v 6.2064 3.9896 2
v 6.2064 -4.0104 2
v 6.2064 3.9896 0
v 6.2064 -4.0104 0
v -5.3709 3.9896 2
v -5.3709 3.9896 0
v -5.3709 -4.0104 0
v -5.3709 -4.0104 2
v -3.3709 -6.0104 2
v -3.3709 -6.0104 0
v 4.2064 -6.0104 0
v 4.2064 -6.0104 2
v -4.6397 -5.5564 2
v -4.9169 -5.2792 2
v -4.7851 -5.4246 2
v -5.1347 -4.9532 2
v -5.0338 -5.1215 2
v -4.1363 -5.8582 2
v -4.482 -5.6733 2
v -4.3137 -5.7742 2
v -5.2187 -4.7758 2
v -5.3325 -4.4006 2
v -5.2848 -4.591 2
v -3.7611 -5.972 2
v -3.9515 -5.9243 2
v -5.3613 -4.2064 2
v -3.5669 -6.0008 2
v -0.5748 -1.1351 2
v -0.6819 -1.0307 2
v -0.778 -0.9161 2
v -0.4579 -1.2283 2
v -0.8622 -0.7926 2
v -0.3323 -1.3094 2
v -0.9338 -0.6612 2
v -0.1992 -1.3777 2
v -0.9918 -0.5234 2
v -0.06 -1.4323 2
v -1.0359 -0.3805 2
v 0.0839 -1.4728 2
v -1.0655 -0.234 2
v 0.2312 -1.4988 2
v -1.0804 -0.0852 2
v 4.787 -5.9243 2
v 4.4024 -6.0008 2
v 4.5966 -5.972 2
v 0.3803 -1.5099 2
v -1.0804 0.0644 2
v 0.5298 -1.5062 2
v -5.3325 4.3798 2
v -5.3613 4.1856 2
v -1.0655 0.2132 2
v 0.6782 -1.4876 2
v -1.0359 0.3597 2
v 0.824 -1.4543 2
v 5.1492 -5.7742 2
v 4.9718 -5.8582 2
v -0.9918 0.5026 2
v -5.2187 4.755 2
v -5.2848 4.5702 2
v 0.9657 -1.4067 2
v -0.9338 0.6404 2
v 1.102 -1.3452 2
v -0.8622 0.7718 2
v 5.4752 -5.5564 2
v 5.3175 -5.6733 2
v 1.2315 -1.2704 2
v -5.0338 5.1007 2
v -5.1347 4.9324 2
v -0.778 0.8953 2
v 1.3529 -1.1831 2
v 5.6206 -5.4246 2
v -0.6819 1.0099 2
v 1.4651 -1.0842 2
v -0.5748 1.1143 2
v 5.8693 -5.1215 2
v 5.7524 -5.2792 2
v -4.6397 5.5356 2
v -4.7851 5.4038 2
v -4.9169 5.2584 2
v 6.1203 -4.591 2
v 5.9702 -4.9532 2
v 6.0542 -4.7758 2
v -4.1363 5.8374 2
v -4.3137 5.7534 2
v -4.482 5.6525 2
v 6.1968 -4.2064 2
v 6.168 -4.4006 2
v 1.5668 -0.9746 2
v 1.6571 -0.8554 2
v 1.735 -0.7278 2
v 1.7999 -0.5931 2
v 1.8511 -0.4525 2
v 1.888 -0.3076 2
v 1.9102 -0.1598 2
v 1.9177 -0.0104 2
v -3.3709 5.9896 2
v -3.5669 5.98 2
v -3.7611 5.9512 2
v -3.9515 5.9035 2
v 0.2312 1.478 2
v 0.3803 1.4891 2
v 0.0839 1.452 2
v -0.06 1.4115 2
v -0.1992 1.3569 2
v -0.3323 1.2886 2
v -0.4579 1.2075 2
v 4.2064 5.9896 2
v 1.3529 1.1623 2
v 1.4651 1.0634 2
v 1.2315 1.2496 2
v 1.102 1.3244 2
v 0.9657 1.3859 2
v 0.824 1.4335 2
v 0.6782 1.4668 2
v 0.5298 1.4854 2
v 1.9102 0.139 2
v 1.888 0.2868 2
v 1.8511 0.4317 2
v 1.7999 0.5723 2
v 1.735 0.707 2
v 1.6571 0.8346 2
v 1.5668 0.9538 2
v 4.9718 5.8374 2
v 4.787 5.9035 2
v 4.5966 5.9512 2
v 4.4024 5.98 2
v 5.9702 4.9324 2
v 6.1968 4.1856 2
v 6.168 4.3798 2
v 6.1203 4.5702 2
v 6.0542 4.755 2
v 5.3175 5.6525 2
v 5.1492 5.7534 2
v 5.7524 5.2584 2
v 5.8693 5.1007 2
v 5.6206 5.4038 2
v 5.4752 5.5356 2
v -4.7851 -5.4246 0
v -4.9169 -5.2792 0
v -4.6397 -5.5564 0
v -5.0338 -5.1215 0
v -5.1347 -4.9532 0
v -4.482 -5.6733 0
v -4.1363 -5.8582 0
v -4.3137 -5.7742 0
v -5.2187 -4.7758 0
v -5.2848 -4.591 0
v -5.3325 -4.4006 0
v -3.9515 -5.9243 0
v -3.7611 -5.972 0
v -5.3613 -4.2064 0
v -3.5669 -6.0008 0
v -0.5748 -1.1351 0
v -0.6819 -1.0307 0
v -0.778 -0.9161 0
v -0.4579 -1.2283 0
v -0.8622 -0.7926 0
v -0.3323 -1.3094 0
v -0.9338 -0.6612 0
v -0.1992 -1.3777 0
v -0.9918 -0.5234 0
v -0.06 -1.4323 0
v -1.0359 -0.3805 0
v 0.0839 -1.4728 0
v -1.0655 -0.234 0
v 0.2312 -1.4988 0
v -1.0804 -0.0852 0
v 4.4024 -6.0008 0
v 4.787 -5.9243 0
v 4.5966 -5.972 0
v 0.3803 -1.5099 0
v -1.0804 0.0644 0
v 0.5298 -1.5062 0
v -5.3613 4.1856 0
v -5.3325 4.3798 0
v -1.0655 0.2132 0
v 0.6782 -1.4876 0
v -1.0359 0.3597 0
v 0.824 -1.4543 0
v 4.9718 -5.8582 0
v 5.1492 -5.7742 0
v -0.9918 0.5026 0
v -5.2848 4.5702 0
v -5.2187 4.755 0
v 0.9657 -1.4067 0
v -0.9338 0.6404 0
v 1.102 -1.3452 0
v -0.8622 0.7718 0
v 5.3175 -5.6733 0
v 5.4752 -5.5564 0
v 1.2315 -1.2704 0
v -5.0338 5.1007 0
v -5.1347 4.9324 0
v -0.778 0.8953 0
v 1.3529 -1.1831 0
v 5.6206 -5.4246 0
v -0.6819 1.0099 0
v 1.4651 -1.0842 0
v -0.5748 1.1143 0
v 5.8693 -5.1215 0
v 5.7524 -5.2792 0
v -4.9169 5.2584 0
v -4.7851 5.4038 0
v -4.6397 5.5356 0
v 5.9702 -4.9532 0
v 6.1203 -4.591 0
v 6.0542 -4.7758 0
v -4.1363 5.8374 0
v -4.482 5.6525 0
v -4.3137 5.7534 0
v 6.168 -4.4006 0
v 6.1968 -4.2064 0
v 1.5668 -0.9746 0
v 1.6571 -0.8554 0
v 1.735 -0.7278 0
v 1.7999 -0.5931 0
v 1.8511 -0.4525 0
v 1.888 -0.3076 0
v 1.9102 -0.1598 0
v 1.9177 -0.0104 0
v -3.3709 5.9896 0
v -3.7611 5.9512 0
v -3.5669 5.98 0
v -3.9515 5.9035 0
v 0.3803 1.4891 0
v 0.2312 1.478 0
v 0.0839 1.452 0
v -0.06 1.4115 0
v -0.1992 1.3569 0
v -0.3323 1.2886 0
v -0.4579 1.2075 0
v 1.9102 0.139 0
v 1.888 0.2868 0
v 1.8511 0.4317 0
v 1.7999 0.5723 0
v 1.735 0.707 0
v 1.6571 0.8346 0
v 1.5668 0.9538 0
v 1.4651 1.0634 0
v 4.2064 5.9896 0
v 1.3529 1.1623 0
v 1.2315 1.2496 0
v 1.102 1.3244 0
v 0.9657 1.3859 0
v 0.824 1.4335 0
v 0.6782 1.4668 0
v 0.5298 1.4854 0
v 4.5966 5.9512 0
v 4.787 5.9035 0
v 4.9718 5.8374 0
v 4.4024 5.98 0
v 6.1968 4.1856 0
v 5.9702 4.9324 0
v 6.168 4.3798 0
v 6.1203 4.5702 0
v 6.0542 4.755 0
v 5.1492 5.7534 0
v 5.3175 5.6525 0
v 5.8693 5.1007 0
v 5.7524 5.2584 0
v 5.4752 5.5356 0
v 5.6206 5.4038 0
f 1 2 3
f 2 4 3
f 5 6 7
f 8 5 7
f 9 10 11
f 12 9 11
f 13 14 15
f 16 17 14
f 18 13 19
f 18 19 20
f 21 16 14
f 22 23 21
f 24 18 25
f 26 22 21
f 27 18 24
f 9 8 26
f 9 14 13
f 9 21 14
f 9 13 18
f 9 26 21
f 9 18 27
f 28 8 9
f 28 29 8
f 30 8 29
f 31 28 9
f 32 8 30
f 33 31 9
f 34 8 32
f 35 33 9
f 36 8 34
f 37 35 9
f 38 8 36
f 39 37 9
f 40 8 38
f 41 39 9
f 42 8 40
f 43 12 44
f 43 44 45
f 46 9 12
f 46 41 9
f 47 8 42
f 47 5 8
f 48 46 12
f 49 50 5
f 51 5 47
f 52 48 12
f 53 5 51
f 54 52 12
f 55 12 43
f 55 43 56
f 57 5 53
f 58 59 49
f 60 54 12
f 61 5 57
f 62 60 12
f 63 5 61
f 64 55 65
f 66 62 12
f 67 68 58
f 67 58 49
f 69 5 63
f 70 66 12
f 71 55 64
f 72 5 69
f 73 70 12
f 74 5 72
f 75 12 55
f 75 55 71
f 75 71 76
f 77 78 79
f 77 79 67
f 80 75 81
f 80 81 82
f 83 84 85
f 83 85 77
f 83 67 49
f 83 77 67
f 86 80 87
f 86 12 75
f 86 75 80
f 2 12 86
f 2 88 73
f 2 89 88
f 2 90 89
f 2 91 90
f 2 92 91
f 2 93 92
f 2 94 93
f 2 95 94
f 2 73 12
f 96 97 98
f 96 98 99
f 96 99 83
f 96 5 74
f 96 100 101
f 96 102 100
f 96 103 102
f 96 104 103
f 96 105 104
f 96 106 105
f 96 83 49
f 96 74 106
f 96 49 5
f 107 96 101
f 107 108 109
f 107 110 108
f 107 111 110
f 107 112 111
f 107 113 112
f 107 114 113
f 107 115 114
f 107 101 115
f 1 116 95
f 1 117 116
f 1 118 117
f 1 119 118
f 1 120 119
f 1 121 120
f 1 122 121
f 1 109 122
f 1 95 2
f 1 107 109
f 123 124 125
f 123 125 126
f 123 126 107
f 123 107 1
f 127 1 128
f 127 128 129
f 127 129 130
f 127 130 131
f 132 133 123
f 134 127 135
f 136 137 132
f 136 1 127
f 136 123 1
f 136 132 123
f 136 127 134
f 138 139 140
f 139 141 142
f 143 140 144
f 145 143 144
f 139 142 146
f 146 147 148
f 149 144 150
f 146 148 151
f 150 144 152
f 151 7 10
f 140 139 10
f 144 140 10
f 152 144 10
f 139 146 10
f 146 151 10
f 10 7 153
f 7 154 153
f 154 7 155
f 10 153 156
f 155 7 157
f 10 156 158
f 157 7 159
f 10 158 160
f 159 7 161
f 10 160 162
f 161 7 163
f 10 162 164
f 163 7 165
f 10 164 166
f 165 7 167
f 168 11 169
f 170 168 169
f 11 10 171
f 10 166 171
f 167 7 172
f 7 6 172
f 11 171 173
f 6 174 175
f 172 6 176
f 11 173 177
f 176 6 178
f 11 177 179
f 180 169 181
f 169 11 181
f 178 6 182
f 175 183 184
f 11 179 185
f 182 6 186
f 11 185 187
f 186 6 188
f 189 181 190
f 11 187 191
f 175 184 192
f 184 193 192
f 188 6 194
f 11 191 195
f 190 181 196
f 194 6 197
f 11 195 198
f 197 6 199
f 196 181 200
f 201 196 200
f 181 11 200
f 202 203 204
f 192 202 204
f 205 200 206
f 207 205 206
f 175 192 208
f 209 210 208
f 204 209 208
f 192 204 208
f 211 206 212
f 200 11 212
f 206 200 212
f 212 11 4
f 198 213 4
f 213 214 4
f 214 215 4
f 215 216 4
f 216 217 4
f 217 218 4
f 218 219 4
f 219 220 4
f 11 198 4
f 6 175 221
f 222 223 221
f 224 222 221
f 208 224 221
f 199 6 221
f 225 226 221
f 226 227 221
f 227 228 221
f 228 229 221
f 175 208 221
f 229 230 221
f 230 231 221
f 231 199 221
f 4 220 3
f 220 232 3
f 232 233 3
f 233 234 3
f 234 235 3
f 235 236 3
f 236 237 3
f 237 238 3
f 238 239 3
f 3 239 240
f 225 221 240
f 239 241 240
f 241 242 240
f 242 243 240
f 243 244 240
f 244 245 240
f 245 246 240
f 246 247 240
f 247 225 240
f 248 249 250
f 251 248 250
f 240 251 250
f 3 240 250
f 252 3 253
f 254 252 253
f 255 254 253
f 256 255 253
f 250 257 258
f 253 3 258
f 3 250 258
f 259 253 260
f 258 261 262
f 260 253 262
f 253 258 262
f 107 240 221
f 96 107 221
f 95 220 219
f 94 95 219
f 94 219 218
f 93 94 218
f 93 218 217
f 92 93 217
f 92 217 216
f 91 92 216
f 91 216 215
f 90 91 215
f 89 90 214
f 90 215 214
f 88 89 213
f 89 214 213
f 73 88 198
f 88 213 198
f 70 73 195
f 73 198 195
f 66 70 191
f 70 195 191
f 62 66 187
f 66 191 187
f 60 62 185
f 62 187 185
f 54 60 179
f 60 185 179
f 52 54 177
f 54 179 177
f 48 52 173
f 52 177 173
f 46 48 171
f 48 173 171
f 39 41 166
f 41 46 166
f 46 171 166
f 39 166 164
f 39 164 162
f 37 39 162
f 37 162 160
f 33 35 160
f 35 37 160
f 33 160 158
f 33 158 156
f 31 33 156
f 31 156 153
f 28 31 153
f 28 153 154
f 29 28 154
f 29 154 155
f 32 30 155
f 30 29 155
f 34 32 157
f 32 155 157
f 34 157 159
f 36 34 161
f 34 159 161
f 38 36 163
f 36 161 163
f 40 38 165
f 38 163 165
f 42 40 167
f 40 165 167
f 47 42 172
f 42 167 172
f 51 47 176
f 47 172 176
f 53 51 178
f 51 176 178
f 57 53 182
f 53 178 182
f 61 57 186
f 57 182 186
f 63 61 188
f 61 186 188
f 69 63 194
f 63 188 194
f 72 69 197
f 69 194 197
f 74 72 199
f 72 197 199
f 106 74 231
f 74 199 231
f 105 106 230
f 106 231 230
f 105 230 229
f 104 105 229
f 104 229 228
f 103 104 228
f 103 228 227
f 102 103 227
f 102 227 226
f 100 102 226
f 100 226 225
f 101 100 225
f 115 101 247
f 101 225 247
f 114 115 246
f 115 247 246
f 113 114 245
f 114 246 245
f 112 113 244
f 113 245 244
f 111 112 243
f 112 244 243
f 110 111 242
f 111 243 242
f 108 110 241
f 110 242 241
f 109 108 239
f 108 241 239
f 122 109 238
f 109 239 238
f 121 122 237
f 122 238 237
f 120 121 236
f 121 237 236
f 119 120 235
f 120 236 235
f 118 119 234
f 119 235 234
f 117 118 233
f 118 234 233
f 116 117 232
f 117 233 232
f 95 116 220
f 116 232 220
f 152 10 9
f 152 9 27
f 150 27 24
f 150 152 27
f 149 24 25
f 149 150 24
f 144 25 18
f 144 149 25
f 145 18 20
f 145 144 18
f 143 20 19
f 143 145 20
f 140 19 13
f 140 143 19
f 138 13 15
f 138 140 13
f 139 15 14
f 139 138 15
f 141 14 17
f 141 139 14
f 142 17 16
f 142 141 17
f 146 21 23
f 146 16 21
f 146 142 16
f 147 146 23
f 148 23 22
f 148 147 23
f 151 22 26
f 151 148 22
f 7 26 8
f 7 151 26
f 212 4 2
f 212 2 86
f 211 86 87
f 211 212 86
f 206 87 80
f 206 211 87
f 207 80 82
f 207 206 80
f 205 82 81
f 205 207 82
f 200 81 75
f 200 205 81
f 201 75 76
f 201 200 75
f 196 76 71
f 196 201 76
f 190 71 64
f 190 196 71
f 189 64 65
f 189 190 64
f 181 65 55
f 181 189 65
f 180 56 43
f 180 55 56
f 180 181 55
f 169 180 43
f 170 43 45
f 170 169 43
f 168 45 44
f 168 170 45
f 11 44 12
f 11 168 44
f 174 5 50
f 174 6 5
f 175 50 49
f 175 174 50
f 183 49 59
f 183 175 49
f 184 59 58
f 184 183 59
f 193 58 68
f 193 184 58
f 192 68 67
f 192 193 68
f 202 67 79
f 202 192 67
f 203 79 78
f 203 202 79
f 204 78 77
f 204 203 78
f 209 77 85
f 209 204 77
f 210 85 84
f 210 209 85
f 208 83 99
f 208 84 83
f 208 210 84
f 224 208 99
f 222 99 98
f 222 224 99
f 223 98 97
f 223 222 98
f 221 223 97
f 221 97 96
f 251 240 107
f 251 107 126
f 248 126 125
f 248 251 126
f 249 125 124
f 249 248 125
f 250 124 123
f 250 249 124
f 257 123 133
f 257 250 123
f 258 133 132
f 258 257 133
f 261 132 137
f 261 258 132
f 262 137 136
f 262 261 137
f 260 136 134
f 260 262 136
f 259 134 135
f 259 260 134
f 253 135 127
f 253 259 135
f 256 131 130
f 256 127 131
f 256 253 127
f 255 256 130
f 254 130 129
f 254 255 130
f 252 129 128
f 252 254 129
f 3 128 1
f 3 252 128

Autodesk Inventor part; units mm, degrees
ref_plane "YZ Plane" through (0, 0, 0) normal (1, 0, 0) x (0, 1, 0)
ref_plane "XZ Plane" through (0, 0, 0) normal (0, 1, 0) x (-1, 0, 0)
ref_plane "XY Plane" through (0, 0, 0) normal (0, 0, 1) x (1, 0, 0)
sketch "washer_sketch" plane through (0, 0, 0) normal (0, 0, 1) x (1, 0, 0)
  line L0 (-5.3709, -5.3107) -> (-5.3709, 4.5904) construction
  line L1 (0.3709, -5.3107) -> (-5.3709, -5.3107) construction
  arc A0 (0.3709, -5.3107) -> (5.3709, -0.3107) centre (0.3709, -0.3107) ccw construction
  arc A1 (5.3709, -0.3107) -> (-3.0036, 4.5904) centre (-0.2505, -0.3107) ccw construction
  line L2 (-5.3709, 4.5904) -> (-3.0036, 4.5904) construction
  circle A2 centre (0.4177, -0.0104) radius 3.55 construction
  circle A3 centre (0.4177, -0.0104) radius 3.55 construction
  circle A4 centre (0.4177, -0.0104) radius 1.5 projected
  line L3 (4.2064, 5.9896) -> (-3.3709, 5.9896)
  line L4 (-5.3709, 3.9896) -> (-5.3709, -4.0104)
  line L5 (-3.3709, -6.0104) -> (4.2064, -6.0104)
  line L6 (6.2064, -4.0104) -> (6.2064, 3.9896)
  arc A5 (6.2064, 3.9896) -> (4.2064, 5.9896) centre (4.2064, 3.9896) ccw
  arc A6 (4.2064, -6.0104) -> (6.2064, -4.0104) centre (4.2064, -4.0104) ccw
  arc A7 (-5.3709, -4.0104) -> (-3.3709, -6.0104) centre (-3.3709, -4.0104) ccw
  arc A8 (-3.3709, 5.9896) -> (-5.3709, 3.9896) centre (-3.3709, 3.9896) ccw
  point P0 (0, 0)
  point P1 (6.2064, 5.9896)
  point P2 (-5.3709, 5.9896)
  point P3 (6.2064, -6.0104)
  dimension "d0" = 12
  dimension "d1" = 11.5773
  dimension "d2" = 5.7886
  dimension "d3" = 6
  dimension "d4" = 2
extrude "washer" add sketch "washer_sketch" along normal blind 2
equation "\"d1\" = 2 * d2"
equation "\"d3\" = 0.5 * d0"
properties part number "mount_linear_stepper_washer_b"
